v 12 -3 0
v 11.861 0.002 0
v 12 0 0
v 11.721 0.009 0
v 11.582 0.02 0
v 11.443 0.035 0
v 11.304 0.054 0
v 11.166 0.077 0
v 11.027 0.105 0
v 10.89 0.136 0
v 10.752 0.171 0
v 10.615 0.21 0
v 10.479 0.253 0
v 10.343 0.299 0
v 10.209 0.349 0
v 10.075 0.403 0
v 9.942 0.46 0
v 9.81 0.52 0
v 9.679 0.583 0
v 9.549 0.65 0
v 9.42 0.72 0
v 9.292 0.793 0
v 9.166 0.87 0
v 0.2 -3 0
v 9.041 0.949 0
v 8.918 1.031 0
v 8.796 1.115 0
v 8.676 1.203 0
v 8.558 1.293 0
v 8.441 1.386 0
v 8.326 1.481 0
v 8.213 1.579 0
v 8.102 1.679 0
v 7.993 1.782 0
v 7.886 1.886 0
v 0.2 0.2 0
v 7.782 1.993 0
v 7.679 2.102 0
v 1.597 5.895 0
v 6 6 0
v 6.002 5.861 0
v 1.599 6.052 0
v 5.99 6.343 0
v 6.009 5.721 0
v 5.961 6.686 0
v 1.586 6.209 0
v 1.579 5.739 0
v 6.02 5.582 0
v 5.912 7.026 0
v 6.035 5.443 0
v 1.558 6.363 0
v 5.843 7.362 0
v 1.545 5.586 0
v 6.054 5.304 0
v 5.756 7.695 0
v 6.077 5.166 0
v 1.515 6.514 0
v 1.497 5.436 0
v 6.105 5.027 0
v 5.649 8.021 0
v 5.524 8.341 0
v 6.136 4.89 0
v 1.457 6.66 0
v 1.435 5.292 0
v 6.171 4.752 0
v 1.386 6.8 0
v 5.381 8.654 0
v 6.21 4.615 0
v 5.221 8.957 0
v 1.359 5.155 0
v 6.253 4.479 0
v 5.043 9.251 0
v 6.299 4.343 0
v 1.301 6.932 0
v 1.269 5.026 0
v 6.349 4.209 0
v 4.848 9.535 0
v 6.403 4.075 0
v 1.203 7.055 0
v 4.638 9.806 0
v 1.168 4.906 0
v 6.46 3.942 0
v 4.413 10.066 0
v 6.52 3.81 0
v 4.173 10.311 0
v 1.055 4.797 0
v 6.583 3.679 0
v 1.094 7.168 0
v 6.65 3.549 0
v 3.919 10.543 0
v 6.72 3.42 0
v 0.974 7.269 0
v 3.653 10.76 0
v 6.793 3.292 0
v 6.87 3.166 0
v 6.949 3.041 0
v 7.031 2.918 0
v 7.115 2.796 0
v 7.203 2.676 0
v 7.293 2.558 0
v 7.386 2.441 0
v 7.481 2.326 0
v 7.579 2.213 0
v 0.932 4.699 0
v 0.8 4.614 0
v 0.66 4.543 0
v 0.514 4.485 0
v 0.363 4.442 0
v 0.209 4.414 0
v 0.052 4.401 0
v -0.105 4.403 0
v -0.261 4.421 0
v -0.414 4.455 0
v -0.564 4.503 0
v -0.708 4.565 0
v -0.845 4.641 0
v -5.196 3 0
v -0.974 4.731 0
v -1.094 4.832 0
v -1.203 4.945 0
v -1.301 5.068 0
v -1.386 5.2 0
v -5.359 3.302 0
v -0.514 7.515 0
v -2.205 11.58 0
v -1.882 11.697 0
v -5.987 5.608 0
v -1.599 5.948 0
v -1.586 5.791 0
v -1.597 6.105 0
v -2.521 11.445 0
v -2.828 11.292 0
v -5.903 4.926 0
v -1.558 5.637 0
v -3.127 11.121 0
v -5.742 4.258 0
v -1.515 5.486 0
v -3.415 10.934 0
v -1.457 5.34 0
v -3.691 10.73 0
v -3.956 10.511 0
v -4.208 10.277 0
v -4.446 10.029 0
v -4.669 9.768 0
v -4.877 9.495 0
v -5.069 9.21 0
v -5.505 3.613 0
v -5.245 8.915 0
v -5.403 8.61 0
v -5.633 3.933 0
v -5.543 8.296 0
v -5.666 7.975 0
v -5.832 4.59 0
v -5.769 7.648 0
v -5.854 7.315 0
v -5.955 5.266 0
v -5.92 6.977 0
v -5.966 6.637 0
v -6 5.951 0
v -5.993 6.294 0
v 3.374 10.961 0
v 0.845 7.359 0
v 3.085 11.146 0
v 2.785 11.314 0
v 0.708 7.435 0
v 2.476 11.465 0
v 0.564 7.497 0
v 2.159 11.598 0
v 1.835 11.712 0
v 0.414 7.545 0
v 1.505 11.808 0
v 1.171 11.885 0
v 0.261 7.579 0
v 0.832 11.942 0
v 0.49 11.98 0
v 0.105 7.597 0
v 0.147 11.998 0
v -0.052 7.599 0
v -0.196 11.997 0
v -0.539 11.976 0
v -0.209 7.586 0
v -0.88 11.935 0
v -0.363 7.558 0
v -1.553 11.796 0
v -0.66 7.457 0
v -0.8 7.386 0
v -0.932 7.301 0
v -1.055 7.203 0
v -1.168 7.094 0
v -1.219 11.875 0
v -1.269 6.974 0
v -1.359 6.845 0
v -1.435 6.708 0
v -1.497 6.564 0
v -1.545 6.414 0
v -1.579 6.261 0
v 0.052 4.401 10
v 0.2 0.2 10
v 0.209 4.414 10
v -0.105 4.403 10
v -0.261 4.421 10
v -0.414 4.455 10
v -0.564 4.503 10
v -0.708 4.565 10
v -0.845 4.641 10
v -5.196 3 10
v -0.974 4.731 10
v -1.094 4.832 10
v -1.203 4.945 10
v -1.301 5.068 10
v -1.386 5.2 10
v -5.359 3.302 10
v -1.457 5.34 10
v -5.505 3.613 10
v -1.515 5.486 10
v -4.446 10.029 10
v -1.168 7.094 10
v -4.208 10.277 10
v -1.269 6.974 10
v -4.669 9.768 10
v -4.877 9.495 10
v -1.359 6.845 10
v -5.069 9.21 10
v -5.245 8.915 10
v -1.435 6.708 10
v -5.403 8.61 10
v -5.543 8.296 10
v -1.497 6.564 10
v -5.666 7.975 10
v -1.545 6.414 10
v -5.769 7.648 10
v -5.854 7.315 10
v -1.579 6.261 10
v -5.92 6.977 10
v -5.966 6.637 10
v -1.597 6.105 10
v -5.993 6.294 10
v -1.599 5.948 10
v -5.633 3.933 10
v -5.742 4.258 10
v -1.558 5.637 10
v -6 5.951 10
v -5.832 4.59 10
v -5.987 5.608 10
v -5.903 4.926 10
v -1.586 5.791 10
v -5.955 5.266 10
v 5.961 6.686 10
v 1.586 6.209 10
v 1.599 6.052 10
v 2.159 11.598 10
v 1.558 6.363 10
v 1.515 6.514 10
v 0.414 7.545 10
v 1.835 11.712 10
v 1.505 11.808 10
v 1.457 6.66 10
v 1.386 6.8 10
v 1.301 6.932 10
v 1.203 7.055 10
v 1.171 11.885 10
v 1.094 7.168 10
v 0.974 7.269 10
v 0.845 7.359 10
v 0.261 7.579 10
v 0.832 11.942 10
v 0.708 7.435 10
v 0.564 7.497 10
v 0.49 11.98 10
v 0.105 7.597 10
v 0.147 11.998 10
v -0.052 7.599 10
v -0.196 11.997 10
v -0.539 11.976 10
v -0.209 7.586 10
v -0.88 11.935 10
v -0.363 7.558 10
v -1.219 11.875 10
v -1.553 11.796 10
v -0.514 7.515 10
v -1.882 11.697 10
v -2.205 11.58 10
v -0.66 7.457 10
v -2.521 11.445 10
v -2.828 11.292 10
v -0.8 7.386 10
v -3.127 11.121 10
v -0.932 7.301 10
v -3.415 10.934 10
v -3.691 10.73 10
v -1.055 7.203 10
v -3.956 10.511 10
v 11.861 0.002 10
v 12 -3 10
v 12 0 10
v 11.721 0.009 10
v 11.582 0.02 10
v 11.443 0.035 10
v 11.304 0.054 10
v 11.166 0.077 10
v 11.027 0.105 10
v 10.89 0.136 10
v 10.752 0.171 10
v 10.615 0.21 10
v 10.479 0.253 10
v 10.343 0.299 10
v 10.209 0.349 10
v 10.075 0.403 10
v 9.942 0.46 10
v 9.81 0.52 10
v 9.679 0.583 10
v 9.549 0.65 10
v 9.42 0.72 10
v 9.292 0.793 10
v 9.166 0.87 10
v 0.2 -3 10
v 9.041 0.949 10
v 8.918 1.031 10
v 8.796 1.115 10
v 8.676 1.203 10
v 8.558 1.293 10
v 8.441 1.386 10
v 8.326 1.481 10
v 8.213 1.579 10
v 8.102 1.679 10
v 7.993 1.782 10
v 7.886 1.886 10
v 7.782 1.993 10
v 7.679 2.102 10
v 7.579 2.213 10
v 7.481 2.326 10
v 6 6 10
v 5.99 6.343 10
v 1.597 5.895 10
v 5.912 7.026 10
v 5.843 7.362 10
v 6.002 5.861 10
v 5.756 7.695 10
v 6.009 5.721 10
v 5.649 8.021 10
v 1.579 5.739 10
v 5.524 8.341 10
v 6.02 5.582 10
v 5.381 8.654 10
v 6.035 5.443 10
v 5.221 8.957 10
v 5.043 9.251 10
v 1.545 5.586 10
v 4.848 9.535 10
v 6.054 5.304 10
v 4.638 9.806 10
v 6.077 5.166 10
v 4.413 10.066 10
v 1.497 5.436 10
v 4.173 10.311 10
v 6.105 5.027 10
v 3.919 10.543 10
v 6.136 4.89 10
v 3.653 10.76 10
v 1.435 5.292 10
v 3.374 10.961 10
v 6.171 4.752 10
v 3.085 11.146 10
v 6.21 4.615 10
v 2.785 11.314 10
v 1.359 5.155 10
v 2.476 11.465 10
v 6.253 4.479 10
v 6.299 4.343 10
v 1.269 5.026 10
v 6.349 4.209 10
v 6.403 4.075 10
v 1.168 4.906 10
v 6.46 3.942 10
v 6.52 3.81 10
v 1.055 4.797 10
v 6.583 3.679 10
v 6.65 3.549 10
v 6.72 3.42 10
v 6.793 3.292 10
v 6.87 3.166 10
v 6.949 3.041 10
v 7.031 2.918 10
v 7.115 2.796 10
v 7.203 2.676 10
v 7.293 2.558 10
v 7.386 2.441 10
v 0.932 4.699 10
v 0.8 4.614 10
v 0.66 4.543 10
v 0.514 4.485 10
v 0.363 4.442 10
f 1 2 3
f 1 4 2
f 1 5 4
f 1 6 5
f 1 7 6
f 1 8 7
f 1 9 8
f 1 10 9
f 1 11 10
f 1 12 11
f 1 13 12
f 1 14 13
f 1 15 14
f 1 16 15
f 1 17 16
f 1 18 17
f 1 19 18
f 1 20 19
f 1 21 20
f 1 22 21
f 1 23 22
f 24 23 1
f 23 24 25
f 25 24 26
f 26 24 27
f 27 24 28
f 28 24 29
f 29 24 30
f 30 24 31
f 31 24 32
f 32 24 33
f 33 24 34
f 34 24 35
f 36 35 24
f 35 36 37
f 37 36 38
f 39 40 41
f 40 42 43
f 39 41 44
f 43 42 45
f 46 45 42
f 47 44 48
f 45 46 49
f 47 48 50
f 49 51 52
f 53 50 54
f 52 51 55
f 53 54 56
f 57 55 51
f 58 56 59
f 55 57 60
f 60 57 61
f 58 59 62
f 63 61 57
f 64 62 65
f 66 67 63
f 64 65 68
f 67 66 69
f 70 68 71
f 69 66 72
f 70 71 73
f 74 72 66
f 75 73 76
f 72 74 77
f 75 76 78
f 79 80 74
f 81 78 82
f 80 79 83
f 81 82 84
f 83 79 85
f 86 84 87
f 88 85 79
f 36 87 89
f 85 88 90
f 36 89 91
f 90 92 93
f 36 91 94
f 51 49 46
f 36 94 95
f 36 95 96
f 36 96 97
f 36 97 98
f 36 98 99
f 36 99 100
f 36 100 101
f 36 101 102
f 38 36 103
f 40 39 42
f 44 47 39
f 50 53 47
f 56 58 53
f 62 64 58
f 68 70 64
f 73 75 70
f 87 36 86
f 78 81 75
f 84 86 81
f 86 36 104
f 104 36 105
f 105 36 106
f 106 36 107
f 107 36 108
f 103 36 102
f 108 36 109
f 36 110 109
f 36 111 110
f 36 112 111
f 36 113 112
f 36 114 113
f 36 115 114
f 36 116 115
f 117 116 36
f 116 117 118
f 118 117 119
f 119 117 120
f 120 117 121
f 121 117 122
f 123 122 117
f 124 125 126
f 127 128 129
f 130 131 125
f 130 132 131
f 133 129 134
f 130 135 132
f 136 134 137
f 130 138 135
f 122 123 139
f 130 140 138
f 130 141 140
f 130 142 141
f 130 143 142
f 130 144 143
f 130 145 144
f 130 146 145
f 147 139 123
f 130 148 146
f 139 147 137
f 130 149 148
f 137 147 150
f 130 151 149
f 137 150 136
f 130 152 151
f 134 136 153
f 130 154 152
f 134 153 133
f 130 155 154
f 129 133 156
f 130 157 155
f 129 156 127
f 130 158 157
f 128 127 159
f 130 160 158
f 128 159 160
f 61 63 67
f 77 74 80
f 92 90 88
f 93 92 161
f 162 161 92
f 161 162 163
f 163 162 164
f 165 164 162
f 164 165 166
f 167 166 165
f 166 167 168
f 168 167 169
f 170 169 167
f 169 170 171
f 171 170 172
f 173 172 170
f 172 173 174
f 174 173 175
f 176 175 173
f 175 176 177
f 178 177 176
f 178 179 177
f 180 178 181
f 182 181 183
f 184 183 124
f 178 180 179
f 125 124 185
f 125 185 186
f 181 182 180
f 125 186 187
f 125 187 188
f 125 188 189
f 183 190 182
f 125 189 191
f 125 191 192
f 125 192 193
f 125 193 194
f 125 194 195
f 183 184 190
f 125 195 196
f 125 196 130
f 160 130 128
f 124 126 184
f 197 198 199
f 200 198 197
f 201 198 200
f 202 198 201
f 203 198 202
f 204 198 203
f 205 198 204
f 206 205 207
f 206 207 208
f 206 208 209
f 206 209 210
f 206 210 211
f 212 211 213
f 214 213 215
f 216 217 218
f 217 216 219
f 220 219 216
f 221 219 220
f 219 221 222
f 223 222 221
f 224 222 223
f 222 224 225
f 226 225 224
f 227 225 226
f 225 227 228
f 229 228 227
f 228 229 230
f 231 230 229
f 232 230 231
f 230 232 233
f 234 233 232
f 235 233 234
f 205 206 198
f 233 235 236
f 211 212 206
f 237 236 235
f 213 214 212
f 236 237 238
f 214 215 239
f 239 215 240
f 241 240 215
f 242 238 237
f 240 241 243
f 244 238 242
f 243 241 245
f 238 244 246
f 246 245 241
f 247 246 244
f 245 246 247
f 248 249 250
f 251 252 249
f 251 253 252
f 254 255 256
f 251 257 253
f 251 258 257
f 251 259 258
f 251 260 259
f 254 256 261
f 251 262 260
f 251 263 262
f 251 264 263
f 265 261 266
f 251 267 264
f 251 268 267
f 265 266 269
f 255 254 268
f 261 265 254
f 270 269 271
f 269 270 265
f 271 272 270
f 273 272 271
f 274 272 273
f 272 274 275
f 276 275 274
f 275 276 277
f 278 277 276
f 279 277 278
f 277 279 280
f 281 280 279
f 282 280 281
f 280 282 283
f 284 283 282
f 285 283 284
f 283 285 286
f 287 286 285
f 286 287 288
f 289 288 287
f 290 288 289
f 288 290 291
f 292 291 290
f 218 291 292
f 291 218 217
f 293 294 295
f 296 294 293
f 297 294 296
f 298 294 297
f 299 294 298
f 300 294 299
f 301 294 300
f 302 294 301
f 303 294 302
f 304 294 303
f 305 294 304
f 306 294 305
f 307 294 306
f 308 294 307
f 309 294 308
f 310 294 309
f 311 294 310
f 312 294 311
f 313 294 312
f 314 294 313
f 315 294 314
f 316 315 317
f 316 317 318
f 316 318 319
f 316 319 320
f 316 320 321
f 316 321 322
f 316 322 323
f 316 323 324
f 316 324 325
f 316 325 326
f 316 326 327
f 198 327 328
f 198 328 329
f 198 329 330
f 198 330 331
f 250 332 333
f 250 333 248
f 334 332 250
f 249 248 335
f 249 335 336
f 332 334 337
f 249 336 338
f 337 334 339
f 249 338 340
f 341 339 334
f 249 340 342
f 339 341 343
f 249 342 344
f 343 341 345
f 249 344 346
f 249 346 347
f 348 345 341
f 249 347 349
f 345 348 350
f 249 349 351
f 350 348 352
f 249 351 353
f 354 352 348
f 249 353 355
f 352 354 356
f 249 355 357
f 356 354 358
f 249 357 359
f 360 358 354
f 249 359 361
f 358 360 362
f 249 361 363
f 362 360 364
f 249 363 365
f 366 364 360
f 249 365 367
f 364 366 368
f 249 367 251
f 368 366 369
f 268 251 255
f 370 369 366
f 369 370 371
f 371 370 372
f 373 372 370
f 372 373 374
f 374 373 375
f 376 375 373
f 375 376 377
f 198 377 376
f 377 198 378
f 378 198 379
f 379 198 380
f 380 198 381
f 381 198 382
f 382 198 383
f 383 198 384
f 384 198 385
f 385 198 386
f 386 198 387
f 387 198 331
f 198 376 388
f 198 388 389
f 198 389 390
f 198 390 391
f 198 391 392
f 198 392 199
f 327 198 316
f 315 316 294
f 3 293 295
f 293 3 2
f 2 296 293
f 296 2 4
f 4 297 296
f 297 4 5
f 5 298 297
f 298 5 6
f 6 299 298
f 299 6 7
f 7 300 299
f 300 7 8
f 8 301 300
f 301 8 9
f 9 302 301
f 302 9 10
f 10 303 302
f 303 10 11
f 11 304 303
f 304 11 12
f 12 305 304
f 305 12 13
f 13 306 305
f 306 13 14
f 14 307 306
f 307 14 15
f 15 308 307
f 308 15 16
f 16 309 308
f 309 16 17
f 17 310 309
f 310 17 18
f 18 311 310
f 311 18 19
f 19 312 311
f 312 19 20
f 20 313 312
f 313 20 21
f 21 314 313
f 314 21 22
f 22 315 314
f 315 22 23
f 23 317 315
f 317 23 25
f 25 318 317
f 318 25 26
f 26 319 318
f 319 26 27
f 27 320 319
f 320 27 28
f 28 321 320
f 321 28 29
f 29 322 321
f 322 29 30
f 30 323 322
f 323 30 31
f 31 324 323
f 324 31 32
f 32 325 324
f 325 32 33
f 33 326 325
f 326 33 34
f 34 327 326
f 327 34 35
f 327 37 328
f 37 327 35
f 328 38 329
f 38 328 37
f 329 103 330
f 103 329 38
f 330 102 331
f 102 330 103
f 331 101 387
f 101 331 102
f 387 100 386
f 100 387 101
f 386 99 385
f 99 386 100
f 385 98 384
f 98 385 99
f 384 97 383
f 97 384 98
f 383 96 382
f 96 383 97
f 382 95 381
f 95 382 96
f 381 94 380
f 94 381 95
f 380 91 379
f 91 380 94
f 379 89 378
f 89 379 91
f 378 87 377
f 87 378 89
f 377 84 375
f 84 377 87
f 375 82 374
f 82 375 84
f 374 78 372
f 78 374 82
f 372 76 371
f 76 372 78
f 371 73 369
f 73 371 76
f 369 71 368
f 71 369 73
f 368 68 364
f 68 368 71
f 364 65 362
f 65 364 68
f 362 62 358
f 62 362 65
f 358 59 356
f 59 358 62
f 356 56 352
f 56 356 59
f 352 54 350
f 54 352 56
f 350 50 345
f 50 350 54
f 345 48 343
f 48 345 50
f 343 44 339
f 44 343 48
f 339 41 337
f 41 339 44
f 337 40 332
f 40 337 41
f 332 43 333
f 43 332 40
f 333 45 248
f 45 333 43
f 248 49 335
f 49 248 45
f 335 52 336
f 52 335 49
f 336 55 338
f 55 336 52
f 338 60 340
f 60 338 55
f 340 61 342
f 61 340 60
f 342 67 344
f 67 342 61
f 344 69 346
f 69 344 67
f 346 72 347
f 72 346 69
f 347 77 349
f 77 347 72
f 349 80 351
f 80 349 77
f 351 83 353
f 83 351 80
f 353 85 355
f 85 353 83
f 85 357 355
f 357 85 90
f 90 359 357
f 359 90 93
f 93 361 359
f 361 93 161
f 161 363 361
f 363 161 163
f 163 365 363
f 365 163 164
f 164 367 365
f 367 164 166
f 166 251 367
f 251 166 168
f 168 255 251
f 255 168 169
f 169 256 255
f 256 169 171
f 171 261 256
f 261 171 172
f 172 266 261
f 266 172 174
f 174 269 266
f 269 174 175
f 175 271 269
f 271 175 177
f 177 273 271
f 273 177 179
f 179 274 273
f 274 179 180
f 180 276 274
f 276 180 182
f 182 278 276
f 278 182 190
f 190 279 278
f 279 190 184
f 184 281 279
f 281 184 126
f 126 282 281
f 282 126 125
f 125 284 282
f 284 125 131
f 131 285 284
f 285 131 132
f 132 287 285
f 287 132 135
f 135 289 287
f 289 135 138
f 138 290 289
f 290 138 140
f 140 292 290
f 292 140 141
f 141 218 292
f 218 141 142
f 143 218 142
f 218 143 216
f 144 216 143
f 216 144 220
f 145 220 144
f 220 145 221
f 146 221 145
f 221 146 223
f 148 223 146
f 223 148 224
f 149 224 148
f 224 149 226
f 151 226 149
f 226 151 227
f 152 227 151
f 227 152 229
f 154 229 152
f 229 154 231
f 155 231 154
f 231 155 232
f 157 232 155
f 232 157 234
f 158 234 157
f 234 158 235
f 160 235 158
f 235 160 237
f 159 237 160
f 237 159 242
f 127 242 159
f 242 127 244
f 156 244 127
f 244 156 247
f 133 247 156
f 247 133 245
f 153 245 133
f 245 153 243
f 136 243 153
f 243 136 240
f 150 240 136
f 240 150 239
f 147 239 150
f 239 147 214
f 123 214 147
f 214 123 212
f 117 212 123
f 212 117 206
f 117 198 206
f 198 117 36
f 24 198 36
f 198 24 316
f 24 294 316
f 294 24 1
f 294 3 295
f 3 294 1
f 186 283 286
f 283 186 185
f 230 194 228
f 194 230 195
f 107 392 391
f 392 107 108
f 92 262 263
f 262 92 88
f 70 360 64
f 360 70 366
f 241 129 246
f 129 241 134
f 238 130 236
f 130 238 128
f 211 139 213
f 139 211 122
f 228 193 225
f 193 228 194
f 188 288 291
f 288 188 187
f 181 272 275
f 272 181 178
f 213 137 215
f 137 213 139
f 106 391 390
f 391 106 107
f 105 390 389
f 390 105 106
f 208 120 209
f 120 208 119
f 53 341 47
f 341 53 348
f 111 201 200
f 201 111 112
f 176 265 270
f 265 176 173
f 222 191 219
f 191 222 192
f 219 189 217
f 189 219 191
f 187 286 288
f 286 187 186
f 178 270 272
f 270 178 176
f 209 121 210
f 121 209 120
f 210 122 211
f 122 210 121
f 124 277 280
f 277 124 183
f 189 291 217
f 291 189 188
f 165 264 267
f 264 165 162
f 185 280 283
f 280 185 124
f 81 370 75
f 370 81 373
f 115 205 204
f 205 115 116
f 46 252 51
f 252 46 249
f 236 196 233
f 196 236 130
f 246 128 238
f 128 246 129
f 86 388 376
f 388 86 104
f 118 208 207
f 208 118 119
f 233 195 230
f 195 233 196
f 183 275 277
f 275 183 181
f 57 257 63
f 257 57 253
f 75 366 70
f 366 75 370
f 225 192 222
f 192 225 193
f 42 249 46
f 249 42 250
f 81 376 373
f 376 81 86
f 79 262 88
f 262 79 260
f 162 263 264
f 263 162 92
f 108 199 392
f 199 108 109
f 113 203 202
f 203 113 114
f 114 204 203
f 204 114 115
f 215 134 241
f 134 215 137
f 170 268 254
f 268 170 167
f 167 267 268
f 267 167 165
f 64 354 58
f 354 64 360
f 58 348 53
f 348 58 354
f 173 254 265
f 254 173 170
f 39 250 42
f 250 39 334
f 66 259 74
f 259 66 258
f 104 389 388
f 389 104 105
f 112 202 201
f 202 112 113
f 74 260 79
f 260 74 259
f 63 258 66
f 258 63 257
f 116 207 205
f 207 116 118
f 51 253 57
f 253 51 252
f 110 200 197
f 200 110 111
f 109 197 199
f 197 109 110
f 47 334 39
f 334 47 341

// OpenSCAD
// Start: lazy_union
default_5_default_5();
// End: lazy_union

// Modules.

// 'PartMaterial undef-default - default 5.0'
module default_5_default_5() {
  // 'None : _combine_solids_and_holes'
  union() {
    // '_combine_solids_and_holes'
    difference() {
      // 'default : _combine_solids_and_holes'
      union() {
        // 'segment : _combine_solids_and_holes'
        union() {
          // 'segment'
          linear_extrude(height=10.0, twist=0.0, slices=4, scale=[1.0, 1.0], $fn=64) {
            polygon(points=[[-5.196152422706632, 2.999999999999999], [-5.359345807173093, 3.3023320220723607], [-5.504966978684949, 3.6135091528379344], [-5.63253847481888, 3.9325111053055166], [-5.741642014393253, 4.258291936473226], [-5.831919868927677, 4.58978347676444], [-5.903076035562465, 4.925898832340205], [-5.9548772075922605, 5.265535948804702], [-5.987153539431621, 5.607581224619141], [-5.999799203504407, 5.950913162376377], [-5.992772737231035, 6.294406045964509], [-5.966097178975909, 6.636933631562744], [-5.9198599925092745, 6.977372840367532], [-5.8542127802311725, 7.314607440941219], [-5.769370786097772, 7.647531709109595], [-5.6656121898799, 7.975054053408235], [-5.543277195067722, 8.296100594190538], [-5.402766913412182, 8.609618684662303], [-5.244542049760554, 8.914580362298041], [-5.0691213914982445, 9.209985719322582], [-4.877080107549693, 9.494866181206813], [-4.669047862515589, 9.768287682428006], [-4.445706752129755, 10.02935372908211], [-4.2077890668049465, 10.27720833830628], [-3.956074890600413, 10.511038844873866], [-3.6913895434837642, 10.730078565759637], [-3.414600875273392, 10.93360931393865], [-3.126616420134143, 11.120963753176502], [-2.8283804209559875, 11.29152758609013], [-2.520870733372216, 11.444741568304913], [-2.205095619568222, 11.580103342104074], [-1.882090442393349, 11.69716908355822], [-1.552914270615124, 11.79555495773441], [-1.2186464064465763, 11.874938377213404], [-0.8803828467321688, 11.935059059788687], [-0.5392326893954074, 11.975719881879288], [-0.19631449693065378, 11.996787524858195], [0.14724737113747216, 11.998192912177227], [0.4903264448020084, 11.979931435855082], [0.8317978370413598, 11.94206297158599], [1.17054193209677, 11.884711682419383], [1.505448056466356, 11.808065611654339], [1.8354181205793174, 11.712376066283547], [2.159370219209926, 11.597956793008436], [2.476242178826366, 11.465182949527057], [2.7849950402433077, 11.314489874467746], [3.0846164651593297, 11.146371660001634], [3.374124055409838, 10.961379531814178], [3.652568574052324, 10.760120041747411], [3.919037057722661, 10.543253079038909], [4.172655810057671, 10.311489706678188], [4.412593266369114, 10.065589829974732], [4.638062720176424, 9.806359704981872], [4.848324902658441, 9.534649294945968], [5.042690406566628, 9.251349483448513], [5.220521946652269, 8.957389153378706], [5.38123644919613, 8.65373214131401], [5.524306963789487, 8.341374077294569], [5.649264391098123, 8.021339120353325], [5.755699020944361, 7.69467660050528], [5.843261875664002, 7.362457578206243], [5.9116658543336476, 7.025771332561811], [5.960686674116667, 6.6857217898010814], [5.990163605641336, 6.343423903725414], [6.000000000000001, 6.000000000000002], [6.002207560108545, 5.860755974338263], [6.008783083839983, 5.721494349039446], [6.019655836303026, 5.582285858994841], [6.034755082606384, 5.443201239095737], [6.0540100878587655, 5.304311224233423], [6.077350117168883, 5.165686549299191], [6.104704435645445, 5.027397949184329], [6.1360023083971615, 4.889516158780128], [6.171173000532744, 4.7521119129778775], [6.210145777160902, 4.615255946668867], [6.252849903390345, 4.479018994744387], [6.299214644329784, 4.343471792095727], [6.349169265087928, 4.208685073614177], [6.402643030773488, 4.074729574191027], [6.459565206495174, 3.9416760287175667], [6.519865057361696, 3.8095951720850865], [6.583471848481764, 3.678557739184875], [6.650314844964088, 3.5486344649082238], [6.720323311917379, 3.419896084146422], [6.793426514450346, 3.292413331790759], [6.869553717671699, 3.1662569427325256], [6.948634186690149, 3.041497651863011], [7.030597186614406, 2.918206194073505], [7.11537198255318, 2.796453304255298], [7.20288783961518, 2.6763097172996804], [7.293074022909118, 2.5578461680979405], [7.385859797543703, 2.4411333915413693], [7.481174428627645, 2.326242122521257], [7.578947181269655, 2.2132430959288927], [7.679107320578441, 2.1022070466555665], [7.781584111662716, 1.9932047095925682], [7.886306819631189, 1.886306819631188], [7.993204709592569, 1.7815841116627151], [8.102207046655566, 1.6791073205784404], [8.213243095928894, 1.5789471812696538], [8.326242122521258, 1.4811744286276438], [8.44113339154137, 1.3858597975437021], [8.557846168097942, 1.293074022909117], [8.67630971729968, 1.2028878396151796], [8.7964533042553, 1.115371982553179], [8.918206194073505, 1.030597186614406], [9.041497651863011, 0.9486341866901489], [9.166256942732527, 0.8695537176716988], [9.29241333179076, 0.7934265144503447], [9.419896084146423, 0.7203233119173778], [9.548634464908226, 0.6503148449640879], [9.678557739184876, 0.5834718484817634], [9.809595172085086, 0.5198650573616952], [9.941676028717568, 0.4595652064951743], [10.074729574191029, 0.40264303077348806], [10.208685073614179, 0.34916926508792745], [10.343471792095727, 0.2992146443297834], [10.479018994744388, 0.2528499033903451], [10.615255946668869, 0.21014577716090166], [10.75211191297788, 0.1711730005327432], [10.889516158780129, 0.13600230839716065], [11.02739794918433, 0.10470443564544318], [11.165686549299192, 0.07735011716888174], [11.304311224233425, 0.05401008785876549], [11.443201239095739, 0.034755082606382715], [11.582285858994844, 0.019655836303025254], [11.721494349039446, 0.008783083839982275], [11.860755974338264, 0.002207560108543838], [12.000000000000002, 0.0], [12.0, -3.0], [0.2, -3.0], [0.2, 0.2]]);
          }
        }
      }
      // 'default'
      multmatrix(m=[[-0.49999999999999994, -0.8660254037844387, 0.0, 0.0], [0.8660254037844387, -0.49999999999999994, 0.0, 6.0], [0.0, 0.0, 1.0, -0.009999999999999787], [0.0, 0.0, 0.0, 1.0]]) {
        // 'axle_hole : _combine_solids_and_holes'
        union() {
          // 'axle_hole'
          cylinder(h=10.02, r1=1.6, r2=1.6, center=false, $fn=64);
        }
      }
    }
  }
} // end module default_5_default_5
